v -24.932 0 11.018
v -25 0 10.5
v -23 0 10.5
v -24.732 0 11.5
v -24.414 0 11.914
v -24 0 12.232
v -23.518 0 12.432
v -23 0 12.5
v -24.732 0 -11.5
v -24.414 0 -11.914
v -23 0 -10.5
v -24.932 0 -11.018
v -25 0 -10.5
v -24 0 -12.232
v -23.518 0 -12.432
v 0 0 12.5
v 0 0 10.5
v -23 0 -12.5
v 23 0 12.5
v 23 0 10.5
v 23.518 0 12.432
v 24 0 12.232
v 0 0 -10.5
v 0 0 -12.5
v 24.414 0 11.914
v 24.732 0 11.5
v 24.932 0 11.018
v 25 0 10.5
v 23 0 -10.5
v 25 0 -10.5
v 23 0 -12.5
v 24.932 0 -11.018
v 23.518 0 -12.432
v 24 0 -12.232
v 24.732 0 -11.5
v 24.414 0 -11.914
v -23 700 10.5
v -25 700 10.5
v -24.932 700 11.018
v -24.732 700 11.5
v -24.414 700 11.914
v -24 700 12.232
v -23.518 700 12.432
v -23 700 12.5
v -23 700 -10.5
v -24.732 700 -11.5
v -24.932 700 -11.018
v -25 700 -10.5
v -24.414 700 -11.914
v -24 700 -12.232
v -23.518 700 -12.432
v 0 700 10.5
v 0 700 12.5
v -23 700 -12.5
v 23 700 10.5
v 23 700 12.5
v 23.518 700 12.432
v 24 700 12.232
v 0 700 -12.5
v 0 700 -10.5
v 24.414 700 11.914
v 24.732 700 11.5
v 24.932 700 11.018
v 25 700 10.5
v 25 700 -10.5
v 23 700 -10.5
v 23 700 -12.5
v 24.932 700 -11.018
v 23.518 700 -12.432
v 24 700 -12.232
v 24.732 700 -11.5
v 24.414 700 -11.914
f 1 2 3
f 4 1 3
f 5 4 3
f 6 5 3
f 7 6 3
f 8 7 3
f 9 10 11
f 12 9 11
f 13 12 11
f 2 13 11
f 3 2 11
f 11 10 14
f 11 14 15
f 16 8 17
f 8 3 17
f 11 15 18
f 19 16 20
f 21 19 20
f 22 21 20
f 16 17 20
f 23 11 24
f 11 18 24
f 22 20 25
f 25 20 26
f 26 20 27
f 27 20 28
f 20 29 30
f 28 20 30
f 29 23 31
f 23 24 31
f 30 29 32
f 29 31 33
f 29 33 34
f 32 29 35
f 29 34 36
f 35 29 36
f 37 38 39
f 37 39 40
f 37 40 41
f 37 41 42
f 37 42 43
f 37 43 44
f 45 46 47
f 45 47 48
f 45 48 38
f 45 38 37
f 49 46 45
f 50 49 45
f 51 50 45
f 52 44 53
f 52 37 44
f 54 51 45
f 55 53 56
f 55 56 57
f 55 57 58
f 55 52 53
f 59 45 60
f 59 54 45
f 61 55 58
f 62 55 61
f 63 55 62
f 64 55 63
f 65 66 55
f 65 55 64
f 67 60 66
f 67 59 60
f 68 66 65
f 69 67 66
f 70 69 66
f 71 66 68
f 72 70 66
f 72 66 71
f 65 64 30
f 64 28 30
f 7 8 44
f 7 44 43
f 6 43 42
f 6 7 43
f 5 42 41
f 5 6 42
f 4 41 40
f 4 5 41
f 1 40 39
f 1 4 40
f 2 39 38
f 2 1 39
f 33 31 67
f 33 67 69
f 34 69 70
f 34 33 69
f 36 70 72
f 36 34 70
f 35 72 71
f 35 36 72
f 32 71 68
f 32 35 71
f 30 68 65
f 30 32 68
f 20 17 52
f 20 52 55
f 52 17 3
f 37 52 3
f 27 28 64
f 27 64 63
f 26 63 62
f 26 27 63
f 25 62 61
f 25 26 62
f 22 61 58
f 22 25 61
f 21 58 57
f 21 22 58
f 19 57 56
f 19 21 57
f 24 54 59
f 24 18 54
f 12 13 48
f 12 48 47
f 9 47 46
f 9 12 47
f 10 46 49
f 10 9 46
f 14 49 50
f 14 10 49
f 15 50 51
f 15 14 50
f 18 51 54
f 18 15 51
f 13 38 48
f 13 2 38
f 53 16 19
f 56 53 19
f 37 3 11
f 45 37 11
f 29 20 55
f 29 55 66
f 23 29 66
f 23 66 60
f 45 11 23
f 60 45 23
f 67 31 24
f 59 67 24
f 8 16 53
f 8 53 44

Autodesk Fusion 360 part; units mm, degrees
sketch "Sketch1" plane through (0, 0, 0) normal (0, 1, 0) x (1, 0, 0)
  line L0 (0, -12.5) -> (23, -12.5)
  line L1 (25, -10.5) -> (25, 10.5)
  line L2 (23, 12.5) -> (0, 12.5)
  line L3 (0, -12.5) -> (-23, -12.5)
  line L4 (-25, -10.5) -> (-25, 10.5)
  line L5 (-23, 12.5) -> (0, 12.5)
  arc A0 (-25, -10.5) -> (-23, -12.5) centre (-23, -10.5) ccw
  arc A1 (23, -12.5) -> (25, -10.5) centre (23, -10.5) ccw
  arc A2 (-23, 12.5) -> (-25, 10.5) centre (-23, 10.5) ccw
  line L6 (-23, 10.5) -> (0, 10.5)
  line L7 (23, 10.5) -> (0, 10.5)
  line L8 (23, -10.5) -> (23, 10.5)
  line L9 (0, -10.5) -> (23, -10.5)
  line L10 (0, -10.5) -> (-23, -10.5)
  line L11 (-23, -10.5) -> (-23, 10.5)
  arc A3 (25, 10.5) -> (23, 12.5) centre (23, 10.5) ccw
  point P0 (25, -12.5)
  dimension "d1" = 12.5
  dimension "d2" = 25
  dimension "d3" = 25
  dimension "d4" = 2
  dimension "d5" = 2
  dimension "d6" = 2
  dimension "d7" = 2
extrude "Extrude1" add sketch "Sketch1" along normal blind 700
